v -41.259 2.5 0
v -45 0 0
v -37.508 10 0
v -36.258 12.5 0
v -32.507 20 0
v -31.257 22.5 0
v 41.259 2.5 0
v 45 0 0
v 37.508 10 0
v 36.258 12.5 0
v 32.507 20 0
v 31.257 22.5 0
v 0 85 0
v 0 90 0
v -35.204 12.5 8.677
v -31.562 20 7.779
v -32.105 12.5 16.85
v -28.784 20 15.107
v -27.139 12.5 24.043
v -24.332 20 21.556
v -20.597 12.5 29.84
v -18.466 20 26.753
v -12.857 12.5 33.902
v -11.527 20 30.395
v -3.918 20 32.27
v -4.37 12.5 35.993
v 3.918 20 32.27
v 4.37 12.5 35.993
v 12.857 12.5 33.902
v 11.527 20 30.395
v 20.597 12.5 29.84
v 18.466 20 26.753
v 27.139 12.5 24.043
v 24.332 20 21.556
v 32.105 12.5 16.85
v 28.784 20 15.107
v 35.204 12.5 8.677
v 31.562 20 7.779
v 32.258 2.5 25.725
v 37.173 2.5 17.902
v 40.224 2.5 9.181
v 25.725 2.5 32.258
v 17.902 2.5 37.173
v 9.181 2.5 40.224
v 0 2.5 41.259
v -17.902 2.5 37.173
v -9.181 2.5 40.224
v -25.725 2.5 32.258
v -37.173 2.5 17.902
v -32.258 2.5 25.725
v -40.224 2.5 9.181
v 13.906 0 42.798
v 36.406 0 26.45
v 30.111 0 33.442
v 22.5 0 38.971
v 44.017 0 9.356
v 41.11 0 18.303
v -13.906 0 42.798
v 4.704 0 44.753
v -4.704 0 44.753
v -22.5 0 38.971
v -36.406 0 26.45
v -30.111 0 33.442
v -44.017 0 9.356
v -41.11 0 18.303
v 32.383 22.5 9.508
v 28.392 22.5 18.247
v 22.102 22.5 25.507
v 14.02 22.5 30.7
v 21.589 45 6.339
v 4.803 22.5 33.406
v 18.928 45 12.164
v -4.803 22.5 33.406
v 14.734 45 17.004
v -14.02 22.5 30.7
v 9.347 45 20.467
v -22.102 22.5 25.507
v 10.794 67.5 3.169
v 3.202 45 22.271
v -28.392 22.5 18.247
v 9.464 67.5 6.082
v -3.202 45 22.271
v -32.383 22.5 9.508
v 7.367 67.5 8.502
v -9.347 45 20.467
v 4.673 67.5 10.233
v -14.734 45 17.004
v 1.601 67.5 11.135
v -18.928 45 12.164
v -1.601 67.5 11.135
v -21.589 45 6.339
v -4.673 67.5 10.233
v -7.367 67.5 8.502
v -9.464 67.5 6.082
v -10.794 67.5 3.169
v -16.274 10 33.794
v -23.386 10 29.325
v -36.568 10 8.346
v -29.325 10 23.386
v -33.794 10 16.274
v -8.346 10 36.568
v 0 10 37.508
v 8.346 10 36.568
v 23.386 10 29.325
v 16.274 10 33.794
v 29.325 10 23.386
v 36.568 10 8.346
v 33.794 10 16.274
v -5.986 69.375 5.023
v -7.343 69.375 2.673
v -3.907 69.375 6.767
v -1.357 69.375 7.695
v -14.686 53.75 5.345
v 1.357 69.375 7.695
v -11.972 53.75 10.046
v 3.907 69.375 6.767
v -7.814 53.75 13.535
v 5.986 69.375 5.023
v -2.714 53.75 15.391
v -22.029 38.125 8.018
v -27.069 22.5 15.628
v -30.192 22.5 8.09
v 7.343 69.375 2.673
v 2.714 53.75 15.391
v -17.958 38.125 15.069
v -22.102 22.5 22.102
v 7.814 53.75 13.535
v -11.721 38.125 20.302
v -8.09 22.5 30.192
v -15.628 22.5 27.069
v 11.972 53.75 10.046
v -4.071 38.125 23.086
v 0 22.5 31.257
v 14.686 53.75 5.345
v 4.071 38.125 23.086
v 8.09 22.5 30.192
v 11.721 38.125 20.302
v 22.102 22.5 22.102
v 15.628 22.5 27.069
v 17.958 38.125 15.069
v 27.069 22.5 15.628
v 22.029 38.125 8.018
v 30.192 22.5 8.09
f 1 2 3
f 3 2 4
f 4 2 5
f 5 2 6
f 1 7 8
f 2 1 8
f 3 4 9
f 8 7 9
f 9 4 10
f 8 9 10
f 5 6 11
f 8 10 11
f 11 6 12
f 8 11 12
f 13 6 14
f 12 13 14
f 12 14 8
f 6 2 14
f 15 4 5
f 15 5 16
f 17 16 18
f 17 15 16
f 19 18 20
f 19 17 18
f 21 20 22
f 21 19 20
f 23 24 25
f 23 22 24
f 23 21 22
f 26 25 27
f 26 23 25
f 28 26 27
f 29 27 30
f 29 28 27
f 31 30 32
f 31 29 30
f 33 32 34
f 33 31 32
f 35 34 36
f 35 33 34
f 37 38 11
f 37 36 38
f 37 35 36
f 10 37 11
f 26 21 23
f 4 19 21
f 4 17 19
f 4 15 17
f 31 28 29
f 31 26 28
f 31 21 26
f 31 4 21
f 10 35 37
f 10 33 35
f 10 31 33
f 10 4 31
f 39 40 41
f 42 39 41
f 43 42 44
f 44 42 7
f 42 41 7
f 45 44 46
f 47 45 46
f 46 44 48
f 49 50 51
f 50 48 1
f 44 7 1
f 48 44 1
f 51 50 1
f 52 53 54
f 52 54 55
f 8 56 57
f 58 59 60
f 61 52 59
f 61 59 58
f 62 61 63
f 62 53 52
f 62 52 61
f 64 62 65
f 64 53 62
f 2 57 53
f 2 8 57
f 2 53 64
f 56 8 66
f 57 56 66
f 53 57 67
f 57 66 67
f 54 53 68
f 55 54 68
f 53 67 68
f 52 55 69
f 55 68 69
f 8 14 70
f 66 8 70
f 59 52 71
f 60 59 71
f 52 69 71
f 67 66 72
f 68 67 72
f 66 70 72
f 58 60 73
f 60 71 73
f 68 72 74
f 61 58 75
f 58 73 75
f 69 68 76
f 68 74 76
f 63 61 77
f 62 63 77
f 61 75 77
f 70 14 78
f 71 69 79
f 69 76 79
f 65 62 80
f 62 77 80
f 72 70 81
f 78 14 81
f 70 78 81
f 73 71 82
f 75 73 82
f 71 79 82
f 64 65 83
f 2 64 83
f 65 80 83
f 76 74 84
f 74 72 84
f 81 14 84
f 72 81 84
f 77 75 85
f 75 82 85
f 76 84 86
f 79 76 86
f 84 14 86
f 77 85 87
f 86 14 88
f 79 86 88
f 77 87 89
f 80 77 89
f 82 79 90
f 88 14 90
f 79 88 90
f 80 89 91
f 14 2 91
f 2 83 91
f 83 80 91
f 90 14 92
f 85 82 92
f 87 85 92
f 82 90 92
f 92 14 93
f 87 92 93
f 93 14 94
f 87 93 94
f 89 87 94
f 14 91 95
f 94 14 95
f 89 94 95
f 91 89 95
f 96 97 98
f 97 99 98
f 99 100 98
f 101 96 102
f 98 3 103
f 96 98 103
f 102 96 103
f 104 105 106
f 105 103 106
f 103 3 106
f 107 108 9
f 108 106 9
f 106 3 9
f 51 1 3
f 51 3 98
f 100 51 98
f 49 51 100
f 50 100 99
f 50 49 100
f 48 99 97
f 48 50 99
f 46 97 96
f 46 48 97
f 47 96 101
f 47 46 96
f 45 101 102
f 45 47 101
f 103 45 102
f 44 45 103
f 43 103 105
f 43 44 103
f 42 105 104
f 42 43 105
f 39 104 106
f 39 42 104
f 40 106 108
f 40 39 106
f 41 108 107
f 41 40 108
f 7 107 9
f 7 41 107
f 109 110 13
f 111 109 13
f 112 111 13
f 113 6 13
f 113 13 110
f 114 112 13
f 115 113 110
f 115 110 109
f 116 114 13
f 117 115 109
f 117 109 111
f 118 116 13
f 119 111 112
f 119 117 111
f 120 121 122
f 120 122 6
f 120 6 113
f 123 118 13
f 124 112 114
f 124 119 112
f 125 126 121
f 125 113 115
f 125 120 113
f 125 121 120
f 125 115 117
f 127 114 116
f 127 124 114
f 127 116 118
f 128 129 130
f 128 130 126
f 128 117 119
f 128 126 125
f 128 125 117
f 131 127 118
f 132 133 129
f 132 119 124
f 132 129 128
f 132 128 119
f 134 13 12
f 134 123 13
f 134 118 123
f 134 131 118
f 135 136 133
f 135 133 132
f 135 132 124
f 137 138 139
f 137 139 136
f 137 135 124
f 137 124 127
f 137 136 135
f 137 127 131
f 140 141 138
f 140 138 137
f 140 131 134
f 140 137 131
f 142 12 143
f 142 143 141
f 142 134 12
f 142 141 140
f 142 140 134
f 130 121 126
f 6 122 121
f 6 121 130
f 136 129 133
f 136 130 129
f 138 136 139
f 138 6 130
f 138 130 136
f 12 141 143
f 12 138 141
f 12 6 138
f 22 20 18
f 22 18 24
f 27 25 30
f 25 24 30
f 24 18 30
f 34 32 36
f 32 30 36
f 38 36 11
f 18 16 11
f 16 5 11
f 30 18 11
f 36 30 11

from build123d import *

# Parameters (mm, degrees)
REVOLVE1_ANGLE      = 180
BOSS_EXTRUDE1_DEPTH = 2.5
BOSS_EXTRUDE2_DEPTH = 2.5
BOSS_EXTRUDE3_DEPTH = 2.5


with BuildPart() as part:
    # Sketch1 → Revolve1 (revolve)
    with BuildSketch(Plane.XY):
        Polygon((0, 0), (45, 0), (0, 90), align=None)
    revolve(axis=Axis((0, 90, 0), (0, -1, 0)), revolution_arc=REVOLVE1_ANGLE)

    # Sketch2 → Cut-Revolve1 (revolve, cut)
    with BuildSketch(Plane(origin=(0, 0, 0), x_dir=(-1, 0, 0), z_dir=(0, 0, -1))):
        Polygon((0, 0), (0, 85), (-42.509177555, 0), align=None)
    revolve(axis=Axis((0, 0, 0), (0, 1, 0)), mode=Mode.SUBTRACT)

    # Sketch3 → Boss-Extrude1 (add)
    with BuildSketch(Plane(origin=(0, 0, 0), x_dir=(-1, 0, 0), z_dir=(0, -1, 0))):
        with BuildLine():
            Line((42.509177555, 0), (-42.509177555, 0))
            ThreePointArc((-42.509177555, 0), (0, -42.509177555), (42.509177555, 0))
        make_face()
    extrude(amount=-BOSS_EXTRUDE1_DEPTH)

    # Sketch4 → Boss-Extrude2 (add)
    with BuildSketch(Plane(origin=(0, 10, 0), x_dir=(-1, 0, 0), z_dir=(0, -1, 0))):
        with BuildLine():
            Line((-38.221336586, 0), (38.221336586, 0))
            ThreePointArc((38.221336586, 0), (0, -38.221336586), (-38.221336586, 0))
        make_face()
    extrude(amount=-BOSS_EXTRUDE2_DEPTH)

    # Sketch5 → Boss-Extrude3 (add)
    with BuildSketch(Plane(origin=(0, 20, 0), x_dir=(-1, 0, 0), z_dir=(0, -1, 0))):
        with BuildLine():
            Line((-33.5, 0), (33.5, 0))
            ThreePointArc((33.5, 0), (0, -33.5), (-33.5, 0))
        make_face()
    extrude(amount=-BOSS_EXTRUDE3_DEPTH)


solid = part.part
